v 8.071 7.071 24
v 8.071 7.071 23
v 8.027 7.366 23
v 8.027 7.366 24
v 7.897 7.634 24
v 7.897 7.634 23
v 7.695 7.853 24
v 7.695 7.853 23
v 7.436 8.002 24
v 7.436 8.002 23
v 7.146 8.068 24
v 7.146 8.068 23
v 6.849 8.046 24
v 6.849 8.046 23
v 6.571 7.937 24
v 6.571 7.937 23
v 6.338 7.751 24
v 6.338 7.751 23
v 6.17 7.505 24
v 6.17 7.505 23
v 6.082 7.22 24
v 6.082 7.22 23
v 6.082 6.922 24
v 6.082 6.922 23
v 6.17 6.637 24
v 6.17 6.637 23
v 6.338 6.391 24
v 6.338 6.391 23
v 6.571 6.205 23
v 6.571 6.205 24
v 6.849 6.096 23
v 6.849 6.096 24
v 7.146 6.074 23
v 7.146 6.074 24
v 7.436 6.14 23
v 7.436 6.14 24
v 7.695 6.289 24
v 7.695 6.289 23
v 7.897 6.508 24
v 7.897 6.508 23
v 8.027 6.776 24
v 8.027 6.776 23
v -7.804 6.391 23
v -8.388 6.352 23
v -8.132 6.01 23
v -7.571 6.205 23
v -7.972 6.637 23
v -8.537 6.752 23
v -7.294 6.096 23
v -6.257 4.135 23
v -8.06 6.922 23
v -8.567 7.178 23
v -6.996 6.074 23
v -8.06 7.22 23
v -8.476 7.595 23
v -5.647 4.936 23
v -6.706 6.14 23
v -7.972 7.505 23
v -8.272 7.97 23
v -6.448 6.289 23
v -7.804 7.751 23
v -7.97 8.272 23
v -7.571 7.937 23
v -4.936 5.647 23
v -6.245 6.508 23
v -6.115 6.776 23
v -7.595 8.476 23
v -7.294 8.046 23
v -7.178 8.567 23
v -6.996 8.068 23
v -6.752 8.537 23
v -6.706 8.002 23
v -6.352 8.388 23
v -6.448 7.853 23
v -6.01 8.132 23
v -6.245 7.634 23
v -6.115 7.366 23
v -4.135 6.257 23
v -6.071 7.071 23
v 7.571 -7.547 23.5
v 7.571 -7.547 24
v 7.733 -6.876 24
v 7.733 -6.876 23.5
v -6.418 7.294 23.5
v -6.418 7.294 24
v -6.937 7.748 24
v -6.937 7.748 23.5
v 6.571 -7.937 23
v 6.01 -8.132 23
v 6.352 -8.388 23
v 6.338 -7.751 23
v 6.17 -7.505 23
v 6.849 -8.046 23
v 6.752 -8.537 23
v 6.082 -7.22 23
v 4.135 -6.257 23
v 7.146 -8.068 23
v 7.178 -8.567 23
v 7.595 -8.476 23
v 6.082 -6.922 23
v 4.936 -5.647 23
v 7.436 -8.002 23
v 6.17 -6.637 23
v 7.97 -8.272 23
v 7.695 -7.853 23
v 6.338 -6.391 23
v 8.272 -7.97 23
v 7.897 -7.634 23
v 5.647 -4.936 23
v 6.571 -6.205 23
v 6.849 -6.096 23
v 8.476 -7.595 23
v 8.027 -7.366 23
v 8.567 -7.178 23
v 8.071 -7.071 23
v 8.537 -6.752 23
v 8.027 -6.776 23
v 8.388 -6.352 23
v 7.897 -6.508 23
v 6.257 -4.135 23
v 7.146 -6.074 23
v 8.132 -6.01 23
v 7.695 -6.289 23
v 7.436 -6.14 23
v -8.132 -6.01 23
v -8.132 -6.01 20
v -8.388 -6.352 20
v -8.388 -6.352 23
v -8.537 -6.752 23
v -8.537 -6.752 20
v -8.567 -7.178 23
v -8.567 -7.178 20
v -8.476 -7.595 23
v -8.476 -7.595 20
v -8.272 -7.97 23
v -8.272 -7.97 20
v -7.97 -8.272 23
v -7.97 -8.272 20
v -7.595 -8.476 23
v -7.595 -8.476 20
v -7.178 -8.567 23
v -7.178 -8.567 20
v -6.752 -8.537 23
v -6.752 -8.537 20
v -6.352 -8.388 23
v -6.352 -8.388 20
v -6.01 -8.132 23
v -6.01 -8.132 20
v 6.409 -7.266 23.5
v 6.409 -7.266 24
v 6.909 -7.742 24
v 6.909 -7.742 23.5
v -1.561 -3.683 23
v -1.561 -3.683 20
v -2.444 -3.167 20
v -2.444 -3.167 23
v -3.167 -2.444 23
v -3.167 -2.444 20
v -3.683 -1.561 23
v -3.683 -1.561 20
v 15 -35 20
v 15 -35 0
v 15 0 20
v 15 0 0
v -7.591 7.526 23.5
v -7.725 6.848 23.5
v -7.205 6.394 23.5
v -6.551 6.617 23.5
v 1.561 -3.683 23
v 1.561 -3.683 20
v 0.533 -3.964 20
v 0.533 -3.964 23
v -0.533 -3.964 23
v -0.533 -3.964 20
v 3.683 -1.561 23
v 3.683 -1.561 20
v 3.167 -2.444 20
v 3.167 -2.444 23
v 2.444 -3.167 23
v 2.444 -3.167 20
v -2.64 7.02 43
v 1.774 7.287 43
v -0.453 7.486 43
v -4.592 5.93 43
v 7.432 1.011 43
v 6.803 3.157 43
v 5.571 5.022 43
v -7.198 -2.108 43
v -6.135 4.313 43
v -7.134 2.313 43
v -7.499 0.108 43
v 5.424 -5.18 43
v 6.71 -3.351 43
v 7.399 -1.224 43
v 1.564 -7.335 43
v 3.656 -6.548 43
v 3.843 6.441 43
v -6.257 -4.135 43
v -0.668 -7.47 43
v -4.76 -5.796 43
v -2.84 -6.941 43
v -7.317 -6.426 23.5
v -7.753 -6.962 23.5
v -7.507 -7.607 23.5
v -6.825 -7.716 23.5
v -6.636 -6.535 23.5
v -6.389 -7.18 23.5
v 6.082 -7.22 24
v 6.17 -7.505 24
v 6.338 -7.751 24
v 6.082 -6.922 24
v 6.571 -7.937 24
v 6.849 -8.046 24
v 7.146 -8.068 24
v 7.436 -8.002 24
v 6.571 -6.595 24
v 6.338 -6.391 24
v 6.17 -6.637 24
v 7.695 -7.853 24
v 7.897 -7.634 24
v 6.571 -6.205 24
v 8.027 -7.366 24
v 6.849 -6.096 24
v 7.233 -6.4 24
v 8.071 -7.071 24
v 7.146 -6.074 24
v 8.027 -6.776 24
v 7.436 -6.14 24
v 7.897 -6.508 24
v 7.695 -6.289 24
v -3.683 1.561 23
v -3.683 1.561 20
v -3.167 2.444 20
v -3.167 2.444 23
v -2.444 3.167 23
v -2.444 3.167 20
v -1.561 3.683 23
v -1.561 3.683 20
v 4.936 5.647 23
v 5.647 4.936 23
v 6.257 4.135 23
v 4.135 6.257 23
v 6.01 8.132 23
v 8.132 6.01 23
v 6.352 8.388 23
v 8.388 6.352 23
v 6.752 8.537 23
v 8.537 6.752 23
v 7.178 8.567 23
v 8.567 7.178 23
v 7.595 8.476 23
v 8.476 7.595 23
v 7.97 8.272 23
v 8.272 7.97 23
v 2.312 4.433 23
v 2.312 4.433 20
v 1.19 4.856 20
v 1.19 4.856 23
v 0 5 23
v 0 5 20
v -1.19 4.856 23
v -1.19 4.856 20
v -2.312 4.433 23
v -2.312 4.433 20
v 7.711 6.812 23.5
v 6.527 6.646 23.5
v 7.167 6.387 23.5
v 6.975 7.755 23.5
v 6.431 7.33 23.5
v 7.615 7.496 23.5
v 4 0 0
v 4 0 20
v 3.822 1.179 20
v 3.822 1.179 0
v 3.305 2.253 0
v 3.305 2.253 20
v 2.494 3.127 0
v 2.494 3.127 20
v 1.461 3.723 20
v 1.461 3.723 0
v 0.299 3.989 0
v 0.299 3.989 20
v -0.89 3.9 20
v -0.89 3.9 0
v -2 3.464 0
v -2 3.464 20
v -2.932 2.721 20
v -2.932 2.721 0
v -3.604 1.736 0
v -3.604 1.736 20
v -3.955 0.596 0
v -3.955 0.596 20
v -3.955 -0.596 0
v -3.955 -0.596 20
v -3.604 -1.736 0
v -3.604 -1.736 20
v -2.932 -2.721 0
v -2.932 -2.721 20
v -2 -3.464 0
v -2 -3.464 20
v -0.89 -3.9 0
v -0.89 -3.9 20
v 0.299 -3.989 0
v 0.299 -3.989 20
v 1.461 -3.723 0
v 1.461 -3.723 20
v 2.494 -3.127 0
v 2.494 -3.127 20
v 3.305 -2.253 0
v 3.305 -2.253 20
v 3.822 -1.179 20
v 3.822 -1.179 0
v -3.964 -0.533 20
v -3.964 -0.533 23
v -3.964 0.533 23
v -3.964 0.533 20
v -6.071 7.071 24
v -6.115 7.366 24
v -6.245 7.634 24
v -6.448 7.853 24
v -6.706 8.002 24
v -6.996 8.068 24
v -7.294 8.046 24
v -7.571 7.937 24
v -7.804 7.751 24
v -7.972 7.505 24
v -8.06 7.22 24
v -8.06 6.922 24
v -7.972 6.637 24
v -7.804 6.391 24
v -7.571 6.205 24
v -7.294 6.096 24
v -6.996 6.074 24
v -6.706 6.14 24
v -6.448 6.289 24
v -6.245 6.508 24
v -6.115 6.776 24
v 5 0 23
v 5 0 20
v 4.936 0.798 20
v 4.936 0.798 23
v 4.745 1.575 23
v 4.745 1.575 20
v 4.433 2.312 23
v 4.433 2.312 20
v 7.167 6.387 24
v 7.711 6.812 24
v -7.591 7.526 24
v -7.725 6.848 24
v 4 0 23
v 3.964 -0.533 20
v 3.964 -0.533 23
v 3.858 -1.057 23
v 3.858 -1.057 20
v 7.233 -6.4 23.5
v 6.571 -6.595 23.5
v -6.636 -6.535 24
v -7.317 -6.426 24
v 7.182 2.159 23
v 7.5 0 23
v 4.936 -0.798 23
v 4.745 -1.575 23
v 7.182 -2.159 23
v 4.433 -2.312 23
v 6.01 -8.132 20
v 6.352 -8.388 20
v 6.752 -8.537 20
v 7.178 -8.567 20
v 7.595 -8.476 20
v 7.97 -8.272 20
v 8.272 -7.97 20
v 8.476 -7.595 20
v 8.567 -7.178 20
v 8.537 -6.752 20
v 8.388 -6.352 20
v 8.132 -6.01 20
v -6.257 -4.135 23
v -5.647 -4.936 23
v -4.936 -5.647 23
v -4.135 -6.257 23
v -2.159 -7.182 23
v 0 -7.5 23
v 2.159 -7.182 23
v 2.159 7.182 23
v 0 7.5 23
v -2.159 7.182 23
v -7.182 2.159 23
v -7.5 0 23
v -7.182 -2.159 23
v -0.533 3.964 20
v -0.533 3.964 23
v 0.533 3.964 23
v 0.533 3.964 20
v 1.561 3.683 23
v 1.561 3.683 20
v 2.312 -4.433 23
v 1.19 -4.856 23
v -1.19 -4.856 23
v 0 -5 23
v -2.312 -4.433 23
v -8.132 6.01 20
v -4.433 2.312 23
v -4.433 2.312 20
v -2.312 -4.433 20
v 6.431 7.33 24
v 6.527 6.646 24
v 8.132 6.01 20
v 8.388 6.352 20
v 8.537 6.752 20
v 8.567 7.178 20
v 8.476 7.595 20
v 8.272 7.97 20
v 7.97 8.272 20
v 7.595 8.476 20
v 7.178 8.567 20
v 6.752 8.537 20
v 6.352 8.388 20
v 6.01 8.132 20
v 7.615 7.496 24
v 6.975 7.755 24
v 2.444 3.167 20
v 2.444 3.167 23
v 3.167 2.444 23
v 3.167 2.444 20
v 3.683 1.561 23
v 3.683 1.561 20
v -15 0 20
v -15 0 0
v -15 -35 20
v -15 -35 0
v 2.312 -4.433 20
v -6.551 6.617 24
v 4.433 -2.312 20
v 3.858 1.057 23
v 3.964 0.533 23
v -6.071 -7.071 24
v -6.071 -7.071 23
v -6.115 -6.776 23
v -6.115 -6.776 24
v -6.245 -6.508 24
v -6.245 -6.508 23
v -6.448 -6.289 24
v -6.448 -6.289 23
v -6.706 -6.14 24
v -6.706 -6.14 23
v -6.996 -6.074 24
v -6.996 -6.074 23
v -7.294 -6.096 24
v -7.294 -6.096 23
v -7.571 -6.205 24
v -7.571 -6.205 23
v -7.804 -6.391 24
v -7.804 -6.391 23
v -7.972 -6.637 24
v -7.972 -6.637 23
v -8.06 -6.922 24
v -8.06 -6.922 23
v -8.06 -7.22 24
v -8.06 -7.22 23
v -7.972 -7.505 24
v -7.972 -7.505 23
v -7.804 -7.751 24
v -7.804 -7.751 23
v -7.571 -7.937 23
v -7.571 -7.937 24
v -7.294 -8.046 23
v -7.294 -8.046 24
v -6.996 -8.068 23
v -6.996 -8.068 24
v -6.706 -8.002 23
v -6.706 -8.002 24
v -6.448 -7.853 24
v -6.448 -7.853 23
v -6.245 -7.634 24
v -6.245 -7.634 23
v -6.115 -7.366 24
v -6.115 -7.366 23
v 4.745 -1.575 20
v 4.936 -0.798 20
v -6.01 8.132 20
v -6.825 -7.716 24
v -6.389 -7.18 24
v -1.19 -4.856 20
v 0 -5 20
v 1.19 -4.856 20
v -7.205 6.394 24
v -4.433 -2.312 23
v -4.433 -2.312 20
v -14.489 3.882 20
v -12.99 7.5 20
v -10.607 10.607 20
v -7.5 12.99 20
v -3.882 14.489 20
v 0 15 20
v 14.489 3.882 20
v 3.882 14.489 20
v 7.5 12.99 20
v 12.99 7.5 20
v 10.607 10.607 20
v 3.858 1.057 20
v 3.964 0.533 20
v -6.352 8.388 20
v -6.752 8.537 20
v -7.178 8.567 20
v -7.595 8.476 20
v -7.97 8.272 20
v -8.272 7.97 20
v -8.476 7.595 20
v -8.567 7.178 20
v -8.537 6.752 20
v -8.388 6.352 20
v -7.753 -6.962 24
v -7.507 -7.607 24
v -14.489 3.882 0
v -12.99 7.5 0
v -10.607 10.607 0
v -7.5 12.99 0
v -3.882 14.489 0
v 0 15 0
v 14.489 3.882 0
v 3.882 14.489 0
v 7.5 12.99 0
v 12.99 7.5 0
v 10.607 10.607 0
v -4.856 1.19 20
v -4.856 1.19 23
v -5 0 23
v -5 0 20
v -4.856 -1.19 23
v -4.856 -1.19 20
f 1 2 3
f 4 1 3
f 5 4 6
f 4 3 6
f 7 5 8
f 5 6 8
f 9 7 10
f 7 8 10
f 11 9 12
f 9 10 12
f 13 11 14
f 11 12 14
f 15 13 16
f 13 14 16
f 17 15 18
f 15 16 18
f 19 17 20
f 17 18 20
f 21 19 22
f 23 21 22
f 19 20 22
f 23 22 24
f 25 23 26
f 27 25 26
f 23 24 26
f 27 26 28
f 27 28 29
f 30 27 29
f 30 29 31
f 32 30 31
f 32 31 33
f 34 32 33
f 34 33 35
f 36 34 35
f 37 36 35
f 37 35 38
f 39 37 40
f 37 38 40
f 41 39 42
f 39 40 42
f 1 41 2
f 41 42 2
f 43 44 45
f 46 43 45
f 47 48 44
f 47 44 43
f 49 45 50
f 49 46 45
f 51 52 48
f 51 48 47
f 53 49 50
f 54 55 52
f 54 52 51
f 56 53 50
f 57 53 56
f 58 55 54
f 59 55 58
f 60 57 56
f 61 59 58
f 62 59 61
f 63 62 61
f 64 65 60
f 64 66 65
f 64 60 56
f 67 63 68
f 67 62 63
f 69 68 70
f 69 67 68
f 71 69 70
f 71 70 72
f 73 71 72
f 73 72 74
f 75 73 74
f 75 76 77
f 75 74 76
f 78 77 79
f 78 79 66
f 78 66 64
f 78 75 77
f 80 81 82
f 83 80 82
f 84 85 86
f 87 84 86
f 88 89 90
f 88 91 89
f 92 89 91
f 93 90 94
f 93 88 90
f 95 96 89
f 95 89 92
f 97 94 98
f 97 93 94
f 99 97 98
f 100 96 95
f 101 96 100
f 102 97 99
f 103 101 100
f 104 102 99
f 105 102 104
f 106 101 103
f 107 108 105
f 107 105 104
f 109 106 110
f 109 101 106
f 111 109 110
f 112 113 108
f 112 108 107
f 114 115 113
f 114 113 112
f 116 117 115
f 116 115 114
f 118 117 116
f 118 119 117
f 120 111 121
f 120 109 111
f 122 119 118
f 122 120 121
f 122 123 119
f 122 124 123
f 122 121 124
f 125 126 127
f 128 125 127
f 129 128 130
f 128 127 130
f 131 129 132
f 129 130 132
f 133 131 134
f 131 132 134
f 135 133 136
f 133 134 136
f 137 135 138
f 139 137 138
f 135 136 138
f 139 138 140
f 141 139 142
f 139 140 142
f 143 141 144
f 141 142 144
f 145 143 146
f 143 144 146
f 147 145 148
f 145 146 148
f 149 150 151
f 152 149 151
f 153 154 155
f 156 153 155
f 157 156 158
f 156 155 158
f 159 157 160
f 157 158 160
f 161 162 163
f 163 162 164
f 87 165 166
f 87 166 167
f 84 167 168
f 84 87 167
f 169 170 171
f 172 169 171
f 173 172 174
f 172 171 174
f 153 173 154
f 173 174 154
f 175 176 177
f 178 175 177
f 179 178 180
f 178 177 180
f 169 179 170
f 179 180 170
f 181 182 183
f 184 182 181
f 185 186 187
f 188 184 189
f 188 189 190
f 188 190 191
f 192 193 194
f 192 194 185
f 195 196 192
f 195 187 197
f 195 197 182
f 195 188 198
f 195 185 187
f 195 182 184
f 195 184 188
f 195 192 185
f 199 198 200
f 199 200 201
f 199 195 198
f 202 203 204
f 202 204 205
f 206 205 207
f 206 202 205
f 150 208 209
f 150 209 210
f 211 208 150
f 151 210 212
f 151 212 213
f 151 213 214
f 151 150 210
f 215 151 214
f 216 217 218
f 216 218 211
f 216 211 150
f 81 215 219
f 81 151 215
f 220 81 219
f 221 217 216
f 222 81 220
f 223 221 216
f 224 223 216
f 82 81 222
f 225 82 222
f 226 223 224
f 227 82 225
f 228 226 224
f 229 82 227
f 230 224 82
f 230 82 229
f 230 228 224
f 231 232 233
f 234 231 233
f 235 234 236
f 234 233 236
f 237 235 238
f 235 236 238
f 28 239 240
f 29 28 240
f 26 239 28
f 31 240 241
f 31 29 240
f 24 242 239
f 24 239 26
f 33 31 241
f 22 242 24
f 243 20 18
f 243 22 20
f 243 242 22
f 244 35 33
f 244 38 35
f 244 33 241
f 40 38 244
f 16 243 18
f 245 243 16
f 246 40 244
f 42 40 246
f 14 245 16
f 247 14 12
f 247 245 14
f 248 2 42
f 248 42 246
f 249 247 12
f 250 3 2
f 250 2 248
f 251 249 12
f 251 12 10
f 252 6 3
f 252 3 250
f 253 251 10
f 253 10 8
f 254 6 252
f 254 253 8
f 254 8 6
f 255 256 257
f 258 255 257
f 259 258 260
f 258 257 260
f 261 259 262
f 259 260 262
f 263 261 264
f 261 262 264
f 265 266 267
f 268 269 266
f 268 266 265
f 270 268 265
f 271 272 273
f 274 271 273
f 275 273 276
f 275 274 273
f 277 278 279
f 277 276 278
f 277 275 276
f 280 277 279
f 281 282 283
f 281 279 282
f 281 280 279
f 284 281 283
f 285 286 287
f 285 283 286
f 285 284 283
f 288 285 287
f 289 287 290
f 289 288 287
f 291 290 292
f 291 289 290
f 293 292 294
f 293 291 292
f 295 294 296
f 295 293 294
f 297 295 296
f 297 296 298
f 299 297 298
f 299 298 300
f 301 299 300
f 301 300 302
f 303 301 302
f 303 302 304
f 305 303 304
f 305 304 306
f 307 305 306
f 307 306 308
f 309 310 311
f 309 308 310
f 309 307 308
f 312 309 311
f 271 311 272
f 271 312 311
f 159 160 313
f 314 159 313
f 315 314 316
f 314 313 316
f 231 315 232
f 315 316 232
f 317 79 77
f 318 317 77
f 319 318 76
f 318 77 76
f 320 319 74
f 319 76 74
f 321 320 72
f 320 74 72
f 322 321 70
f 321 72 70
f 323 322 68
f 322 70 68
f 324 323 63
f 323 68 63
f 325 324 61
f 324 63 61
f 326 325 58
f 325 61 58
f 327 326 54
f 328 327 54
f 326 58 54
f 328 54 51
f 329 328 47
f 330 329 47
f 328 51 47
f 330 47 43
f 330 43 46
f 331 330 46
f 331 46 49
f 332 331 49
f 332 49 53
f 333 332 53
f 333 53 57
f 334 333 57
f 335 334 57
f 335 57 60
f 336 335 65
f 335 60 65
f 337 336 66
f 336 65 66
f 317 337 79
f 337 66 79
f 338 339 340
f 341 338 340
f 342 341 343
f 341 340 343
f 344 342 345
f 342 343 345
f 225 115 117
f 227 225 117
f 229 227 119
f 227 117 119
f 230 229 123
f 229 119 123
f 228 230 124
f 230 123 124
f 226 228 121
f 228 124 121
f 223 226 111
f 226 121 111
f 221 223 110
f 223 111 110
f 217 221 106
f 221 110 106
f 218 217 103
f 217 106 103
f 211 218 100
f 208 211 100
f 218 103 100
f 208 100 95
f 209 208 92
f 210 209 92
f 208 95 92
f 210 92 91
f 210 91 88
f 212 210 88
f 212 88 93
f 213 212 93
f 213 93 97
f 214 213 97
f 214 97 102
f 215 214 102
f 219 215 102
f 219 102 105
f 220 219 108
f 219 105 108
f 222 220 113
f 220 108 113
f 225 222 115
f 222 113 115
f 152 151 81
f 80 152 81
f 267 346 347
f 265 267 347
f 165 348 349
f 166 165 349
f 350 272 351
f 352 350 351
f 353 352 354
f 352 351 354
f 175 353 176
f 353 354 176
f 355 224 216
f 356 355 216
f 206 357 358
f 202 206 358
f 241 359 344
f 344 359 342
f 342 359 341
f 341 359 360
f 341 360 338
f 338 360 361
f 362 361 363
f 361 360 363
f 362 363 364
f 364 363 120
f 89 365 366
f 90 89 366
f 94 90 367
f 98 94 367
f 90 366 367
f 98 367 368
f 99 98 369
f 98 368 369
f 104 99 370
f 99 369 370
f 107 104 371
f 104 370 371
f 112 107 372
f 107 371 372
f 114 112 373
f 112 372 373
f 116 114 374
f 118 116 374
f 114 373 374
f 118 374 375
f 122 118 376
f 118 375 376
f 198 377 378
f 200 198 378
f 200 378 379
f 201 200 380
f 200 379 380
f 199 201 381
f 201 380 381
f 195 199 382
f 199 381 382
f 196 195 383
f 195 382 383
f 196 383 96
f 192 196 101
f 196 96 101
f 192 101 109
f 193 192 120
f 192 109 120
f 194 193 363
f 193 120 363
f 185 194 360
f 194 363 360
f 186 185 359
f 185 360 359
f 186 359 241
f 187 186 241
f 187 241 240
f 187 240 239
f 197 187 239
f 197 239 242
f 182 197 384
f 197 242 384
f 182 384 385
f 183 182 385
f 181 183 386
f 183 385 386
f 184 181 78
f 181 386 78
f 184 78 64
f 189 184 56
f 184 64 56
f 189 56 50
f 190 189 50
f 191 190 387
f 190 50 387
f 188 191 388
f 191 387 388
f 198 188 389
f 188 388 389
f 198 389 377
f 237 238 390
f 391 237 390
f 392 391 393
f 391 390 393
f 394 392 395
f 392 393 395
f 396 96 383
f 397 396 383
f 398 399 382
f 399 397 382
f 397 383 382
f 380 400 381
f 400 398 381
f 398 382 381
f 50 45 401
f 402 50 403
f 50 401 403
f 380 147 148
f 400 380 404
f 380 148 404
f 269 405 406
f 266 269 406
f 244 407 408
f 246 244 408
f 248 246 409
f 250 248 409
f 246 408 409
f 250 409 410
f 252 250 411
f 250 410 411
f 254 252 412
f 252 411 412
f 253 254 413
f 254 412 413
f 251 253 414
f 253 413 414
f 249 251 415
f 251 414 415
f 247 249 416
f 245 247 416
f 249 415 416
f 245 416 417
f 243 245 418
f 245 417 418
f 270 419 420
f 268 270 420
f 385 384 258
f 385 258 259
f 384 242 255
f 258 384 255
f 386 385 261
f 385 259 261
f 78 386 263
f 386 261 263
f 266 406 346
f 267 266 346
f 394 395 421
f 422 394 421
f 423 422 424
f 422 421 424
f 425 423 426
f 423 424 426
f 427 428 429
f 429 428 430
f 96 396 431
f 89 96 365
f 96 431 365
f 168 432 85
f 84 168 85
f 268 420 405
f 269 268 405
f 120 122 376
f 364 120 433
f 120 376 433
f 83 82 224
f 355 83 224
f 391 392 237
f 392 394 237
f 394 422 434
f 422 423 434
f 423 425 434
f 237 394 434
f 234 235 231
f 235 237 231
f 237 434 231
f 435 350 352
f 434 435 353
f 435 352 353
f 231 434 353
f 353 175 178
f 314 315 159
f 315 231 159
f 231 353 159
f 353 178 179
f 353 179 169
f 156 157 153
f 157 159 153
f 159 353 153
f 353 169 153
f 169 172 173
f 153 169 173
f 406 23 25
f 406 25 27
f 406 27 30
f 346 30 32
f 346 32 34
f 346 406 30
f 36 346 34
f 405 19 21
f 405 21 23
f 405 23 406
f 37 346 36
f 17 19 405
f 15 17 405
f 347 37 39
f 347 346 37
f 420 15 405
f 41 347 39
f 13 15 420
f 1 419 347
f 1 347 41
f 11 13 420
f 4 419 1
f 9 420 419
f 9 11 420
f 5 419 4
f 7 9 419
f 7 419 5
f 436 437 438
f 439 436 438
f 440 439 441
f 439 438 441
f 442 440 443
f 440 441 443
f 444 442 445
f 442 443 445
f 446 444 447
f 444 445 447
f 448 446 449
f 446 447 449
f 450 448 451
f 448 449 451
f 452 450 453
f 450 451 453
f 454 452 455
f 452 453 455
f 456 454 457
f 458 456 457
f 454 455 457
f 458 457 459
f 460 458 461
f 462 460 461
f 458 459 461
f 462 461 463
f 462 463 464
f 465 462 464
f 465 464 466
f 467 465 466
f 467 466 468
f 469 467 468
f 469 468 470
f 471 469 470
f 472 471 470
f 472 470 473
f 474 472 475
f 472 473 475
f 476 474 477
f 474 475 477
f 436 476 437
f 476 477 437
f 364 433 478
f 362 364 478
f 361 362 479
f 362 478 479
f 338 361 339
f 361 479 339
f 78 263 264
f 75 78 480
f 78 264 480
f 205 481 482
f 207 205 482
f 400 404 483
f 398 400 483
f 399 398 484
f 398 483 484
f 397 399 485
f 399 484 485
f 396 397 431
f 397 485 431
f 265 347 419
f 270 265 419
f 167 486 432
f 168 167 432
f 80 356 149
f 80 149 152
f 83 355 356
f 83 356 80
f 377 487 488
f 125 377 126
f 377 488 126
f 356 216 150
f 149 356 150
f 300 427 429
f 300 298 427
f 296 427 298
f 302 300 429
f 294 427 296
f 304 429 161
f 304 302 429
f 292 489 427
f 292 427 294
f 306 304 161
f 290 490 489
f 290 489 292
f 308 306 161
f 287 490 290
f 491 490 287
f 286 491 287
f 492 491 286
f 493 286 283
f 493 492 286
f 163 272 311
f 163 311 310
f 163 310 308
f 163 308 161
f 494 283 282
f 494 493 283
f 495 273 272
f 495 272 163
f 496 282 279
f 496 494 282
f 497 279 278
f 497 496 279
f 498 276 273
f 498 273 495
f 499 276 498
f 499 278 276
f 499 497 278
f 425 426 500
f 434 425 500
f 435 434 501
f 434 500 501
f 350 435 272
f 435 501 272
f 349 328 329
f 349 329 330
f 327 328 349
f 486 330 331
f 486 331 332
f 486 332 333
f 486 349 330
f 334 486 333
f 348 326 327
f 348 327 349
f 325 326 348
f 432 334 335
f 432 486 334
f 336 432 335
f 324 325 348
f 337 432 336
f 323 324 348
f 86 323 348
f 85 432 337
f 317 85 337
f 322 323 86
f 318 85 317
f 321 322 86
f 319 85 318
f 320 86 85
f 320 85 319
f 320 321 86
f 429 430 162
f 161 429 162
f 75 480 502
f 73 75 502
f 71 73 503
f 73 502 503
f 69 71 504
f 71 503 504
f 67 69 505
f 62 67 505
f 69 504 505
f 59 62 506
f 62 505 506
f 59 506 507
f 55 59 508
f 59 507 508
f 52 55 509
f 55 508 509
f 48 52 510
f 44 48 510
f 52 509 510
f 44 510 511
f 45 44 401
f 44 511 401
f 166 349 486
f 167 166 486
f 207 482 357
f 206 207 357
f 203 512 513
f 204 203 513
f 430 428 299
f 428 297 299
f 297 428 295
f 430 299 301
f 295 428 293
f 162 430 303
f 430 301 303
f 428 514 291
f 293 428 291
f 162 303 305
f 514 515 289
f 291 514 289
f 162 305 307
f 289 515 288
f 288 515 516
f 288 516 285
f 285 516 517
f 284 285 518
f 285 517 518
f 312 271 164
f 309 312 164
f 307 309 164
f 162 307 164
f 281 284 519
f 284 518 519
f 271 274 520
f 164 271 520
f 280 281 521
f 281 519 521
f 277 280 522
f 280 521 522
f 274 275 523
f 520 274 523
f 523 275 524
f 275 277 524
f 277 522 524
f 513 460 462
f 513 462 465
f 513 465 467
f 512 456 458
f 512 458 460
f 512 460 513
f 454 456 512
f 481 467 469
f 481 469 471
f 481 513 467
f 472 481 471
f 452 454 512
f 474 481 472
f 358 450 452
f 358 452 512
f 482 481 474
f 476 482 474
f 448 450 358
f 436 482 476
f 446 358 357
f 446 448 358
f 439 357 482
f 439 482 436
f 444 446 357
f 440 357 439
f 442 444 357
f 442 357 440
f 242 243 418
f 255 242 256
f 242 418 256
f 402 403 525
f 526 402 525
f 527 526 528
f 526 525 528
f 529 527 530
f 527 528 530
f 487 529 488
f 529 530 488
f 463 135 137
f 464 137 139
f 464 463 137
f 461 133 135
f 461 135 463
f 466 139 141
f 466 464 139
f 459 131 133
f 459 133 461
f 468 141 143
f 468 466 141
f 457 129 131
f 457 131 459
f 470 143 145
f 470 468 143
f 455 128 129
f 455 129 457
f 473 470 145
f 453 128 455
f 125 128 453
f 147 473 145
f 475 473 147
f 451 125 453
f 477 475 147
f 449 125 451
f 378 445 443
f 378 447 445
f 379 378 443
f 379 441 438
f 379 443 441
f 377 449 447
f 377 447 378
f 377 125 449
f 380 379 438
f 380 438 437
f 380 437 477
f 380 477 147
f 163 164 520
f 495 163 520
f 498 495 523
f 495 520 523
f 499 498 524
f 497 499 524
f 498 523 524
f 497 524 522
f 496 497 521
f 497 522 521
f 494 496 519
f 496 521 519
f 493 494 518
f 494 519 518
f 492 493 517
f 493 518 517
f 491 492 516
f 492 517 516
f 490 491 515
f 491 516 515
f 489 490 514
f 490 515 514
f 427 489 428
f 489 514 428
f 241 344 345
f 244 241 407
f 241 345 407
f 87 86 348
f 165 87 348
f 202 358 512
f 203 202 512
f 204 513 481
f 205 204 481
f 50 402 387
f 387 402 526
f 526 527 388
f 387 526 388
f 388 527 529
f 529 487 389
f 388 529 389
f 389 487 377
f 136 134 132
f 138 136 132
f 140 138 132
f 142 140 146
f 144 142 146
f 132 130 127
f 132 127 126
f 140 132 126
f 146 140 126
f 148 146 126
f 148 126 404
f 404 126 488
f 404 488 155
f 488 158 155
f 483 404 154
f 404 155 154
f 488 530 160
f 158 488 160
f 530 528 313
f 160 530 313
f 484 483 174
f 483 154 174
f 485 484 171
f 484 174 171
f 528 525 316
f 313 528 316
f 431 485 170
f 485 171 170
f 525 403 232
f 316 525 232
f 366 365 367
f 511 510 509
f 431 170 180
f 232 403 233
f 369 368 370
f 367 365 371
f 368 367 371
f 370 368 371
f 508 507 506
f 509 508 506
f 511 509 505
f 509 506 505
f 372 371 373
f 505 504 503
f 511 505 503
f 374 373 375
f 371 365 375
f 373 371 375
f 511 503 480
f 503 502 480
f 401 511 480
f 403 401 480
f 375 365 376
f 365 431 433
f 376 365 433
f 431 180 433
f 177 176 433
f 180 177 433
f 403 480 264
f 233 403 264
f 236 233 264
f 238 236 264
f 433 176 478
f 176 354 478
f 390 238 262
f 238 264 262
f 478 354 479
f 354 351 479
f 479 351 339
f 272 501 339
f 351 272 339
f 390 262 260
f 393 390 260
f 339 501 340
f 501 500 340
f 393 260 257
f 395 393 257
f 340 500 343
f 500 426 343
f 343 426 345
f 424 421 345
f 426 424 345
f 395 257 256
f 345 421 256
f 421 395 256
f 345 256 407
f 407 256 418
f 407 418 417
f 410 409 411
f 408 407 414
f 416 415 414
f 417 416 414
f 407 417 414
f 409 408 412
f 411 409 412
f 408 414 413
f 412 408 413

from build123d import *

# Parameters (mm, degrees)
BOSS_EXTRUDE1_DEPTH     = 20
CUT_EXTRUDE1_DEPTH      = 44.011626335
CUT_EXTRUDE1_DEPTH_BACK = 44.011626335
SKETCH2_R               = 4
SKETCH4_R               = 1.5
BOSS_EXTRUDE2_DEPTH     = 3
SKETCH5_R               = 1
BOSS_EXTRUDE3_DEPTH     = 1
CUT_EXTRUDE2_DEPTH      = 0.5
SKETCH7_R               = 7.5
BOSS_EXTRUDE4_DEPTH     = 20


with BuildPart() as part:
    # Sketch1 → Boss-Extrude1 (new body)
    with BuildSketch(Plane.XY):
        with BuildLine():
            ThreePointArc((15, 0), (0, 15), (-15, 0))
            Line((-15, 0), (15, 0))
        make_face()
        with BuildLine():
            Line((15, 0), (-15, 0))
            ThreePointArc((-15, 0), (0, -15), (15, 0))
        make_face()
        with BuildLine():
            ThreePointArc((15, 0), (0, -15), (-15, 0))
            Line((-15, 0), (-15, -35))
            Line((-15, -35), (15, -35))
            Line((15, -35), (15, 0))
        make_face()
    extrude(amount=BOSS_EXTRUDE1_DEPTH)

    # Sketch2 → Cut-Extrude1 (cut, two sides: drawn at the far end of the back side and taken through both)
    with BuildSketch(Plane.XY.offset(20).offset(-CUT_EXTRUDE1_DEPTH_BACK)):
        Circle(SKETCH2_R)
    extrude(amount=CUT_EXTRUDE1_DEPTH + CUT_EXTRUDE1_DEPTH_BACK, mode=Mode.SUBTRACT)


with BuildPart() as body_2:
    # Sketch4 → Boss-Extrude2 (new body)
    with BuildSketch(Plane.XY.offset(20)):
        with Locations((7.071067812, -7.071067812)):
            Circle(SKETCH4_R)
        with BuildLine():
            Line((8.131727984, -6.01040764), (4.433344563, -2.312024219))
            ThreePointArc((4.433344563, -2.312024219), (3.535533906, -3.535533906), (2.312024219, -4.433344563))
            Line((2.312024219, -4.433344563), (6.01040764, -8.131727984))
            ThreePointArc((6.01040764, -8.131727984), (6.01040764, -6.01040764), (8.131727984, -6.01040764))
        make_face()
        with BuildLine():
            ThreePointArc((5, 0), (4.856270319, 1.190226278), (4.433344563, 2.312024219))
            Line((4.433344563, 2.312024219), (3.682682292, 1.561361949))
            ThreePointArc((3.682682292, 1.561361949), (3.919867929, 0.796640079), (4, 0))
            ThreePointArc((4, 0), (3.919867929, -0.796640079), (3.682682292, -1.561361949))
            Line((3.682682292, -1.561361949), (4.433344563, -2.312024219))
            ThreePointArc((4.433344563, -2.312024219), (4.856270319, -1.190226278), (5, 0))
        make_face()
        with BuildLine():
            ThreePointArc((2.312024219, -4.433344563), (3.535533906, -3.535533906), (4.433344563, -2.312024219))
            Line((4.433344563, -2.312024219), (3.682682292, -1.561361949))
            ThreePointArc((3.682682292, -1.561361949), (2.828427125, -2.828427125), (1.561361949, -3.682682292))
            Line((1.561361949, -3.682682292), (2.312024219, -4.433344563))
        make_face()
        with BuildLine():
            Line((-1.561361949, 3.682682292), (-2.312024219, 4.433344563))
            ThreePointArc((-2.312024219, 4.433344563), (-3.535533906, 3.535533906), (-4.433344563, 2.312024219))
            Line((-4.433344563, 2.312024219), (-3.682682292, 1.561361949))
            ThreePointArc((-3.682682292, 1.561361949), (-2.828427125, 2.828427125), (-1.561361949, 3.682682292))
        make_face()
        with BuildLine():
            ThreePointArc((-2.312024219, -4.433344563), (0, -5), (2.312024219, -4.433344563))
            Line((2.312024219, -4.433344563), (1.561361949, -3.682682292))
            ThreePointArc((1.561361949, -3.682682292), (0, -4), (-1.561361949, -3.682682292))
            Line((-1.561361949, -3.682682292), (-2.312024219, -4.433344563))
        make_face()
        with BuildLine():
            Line((3.682682292, 1.561361949), (4.433344563, 2.312024219))
            ThreePointArc((4.433344563, 2.312024219), (3.535533906, 3.535533906), (2.312024219, 4.433344563))
            Line((2.312024219, 4.433344563), (1.561361949, 3.682682292))
            ThreePointArc((1.561361949, 3.682682292), (2.828427125, 2.828427125), (3.682682292, 1.561361949))
        make_face()
        with BuildLine():
            Line((-2.312024219, -4.433344563), (-1.561361949, -3.682682292))
            ThreePointArc((-1.561361949, -3.682682292), (-2.828427125, -2.828427125), (-3.682682292, -1.561361949))
            Line((-3.682682292, -1.561361949), (-4.433344563, -2.312024219))
            ThreePointArc((-4.433344563, -2.312024219), (-3.535533906, -3.535533906), (-2.312024219, -4.433344563))
        make_face()
        with BuildLine():
            Line((-3.682682292, 1.561361949), (-4.433344563, 2.312024219))
            ThreePointArc((-4.433344563, 2.312024219), (-5, 0), (-4.433344563, -2.312024219))
            Line((-4.433344563, -2.312024219), (-3.682682292, -1.561361949))
            ThreePointArc((-3.682682292, -1.561361949), (-4, 0), (-3.682682292, 1.561361949))
        make_face()
        with BuildLine():
            Line((1.561361949, 3.682682292), (2.312024219, 4.433344563))
            ThreePointArc((2.312024219, 4.433344563), (0, 5), (-2.312024219, 4.433344563))
            Line((-2.312024219, 4.433344563), (-1.561361949, 3.682682292))
            ThreePointArc((-1.561361949, 3.682682292), (0, 4), (1.561361949, 3.682682292))
        make_face()
        with BuildLine():
            Line((4.433344563, 2.312024219), (8.131727984, 6.01040764))
            ThreePointArc((8.131727984, 6.01040764), (6.01040764, 6.01040764), (6.01040764, 8.131727984))
            Line((6.01040764, 8.131727984), (2.312024219, 4.433344563))
            ThreePointArc((2.312024219, 4.433344563), (3.535533906, 3.535533906), (4.433344563, 2.312024219))
        make_face()
        with Locations((7.071067812, 7.071067812)):
            Circle(SKETCH4_R)
        with Locations((-7.071067812, 7.071067812)):
            Circle(SKETCH4_R)
        with BuildLine():
            ThreePointArc((-4.433344563, 2.312024219), (-3.535533906, 3.535533906), (-2.312024219, 4.433344563))
            Line((-2.312024219, 4.433344563), (-6.01040764, 8.131727984))
            ThreePointArc((-6.01040764, 8.131727984), (-5.685248513, 7.64509296), (-5.571067812, 7.071067812))
            ThreePointArc((-5.571067812, 7.071067812), (-6.497042663, 5.685248513), (-8.131727984, 6.01040764))
            Line((-8.131727984, 6.01040764), (-4.433344563, 2.312024219))
        make_face()
        with BuildLine():
            Line((-6.01040764, -8.131727984), (-2.312024219, -4.433344563))
            ThreePointArc((-2.312024219, -4.433344563), (-3.535533906, -3.535533906), (-4.433344563, -2.312024219))
            Line((-4.433344563, -2.312024219), (-8.131727984, -6.01040764))
            ThreePointArc((-8.131727984, -6.01040764), (-6.497042663, -5.685248513), (-5.571067812, -7.071067812))
            ThreePointArc((-5.571067812, -7.071067812), (-5.685248513, -7.64509296), (-6.01040764, -8.131727984))
        make_face()
        with Locations((-7.071067812, -7.071067812)):
            Circle(SKETCH4_R)
    extrude(amount=BOSS_EXTRUDE2_DEPTH)

    # Sketch5 → Boss-Extrude3 (add)
    with BuildSketch(Plane.XY.offset(23)):
        with Locations((7.071067812, -7.071067812)):
            Circle(SKETCH5_R)
        with Locations((-7.071067812, -7.071067812)):
            Circle(SKETCH5_R)
        with Locations((-7.071067812, 7.071067812)):
            Circle(SKETCH5_R)
        with Locations((7.071067812, 7.071067812)):
            Circle(SKETCH5_R)
    extrude(amount=BOSS_EXTRUDE3_DEPTH)

    # Sketch6 → Cut-Extrude2 (cut)
    with BuildSketch(Plane.XY.offset(24)):
        Polygon((7.233361769, -6.400017083), (6.571067812, -6.594991758), (6.408773855, -7.266042487), (6.908773855, -7.742118541), (7.571067812, -7.547143866), (7.733361769, -6.876093137), align=None)
        Polygon((-7.317210607, -6.426039027), (-7.752750524, -6.961719333), (-7.506607728, -7.606748118), (-6.824925017, -7.716096597), (-6.3893851, -7.180416291), (-6.635527895, -6.535387506), align=None)
        Polygon((-7.590724774, 7.525606096), (-7.724537994, 6.848300824), (-7.204881032, 6.39376254), (-6.55141085, 6.616529528), (-6.41759763, 7.2938348), (-6.937254592, 7.748373084), align=None)
        Polygon((6.975043436, 7.754754676), (6.430965431, 7.329751695), (6.526989807, 6.646064831), (7.167092188, 6.387380947), (7.711170193, 6.812383929), (7.615145817, 7.496070793), align=None)
    extrude(amount=-CUT_EXTRUDE2_DEPTH, mode=Mode.SUBTRACT)

    # Sketch7 → Boss-Extrude4 (add)
    with BuildSketch(Plane.XY.offset(23)):
        with Locations(Location((0, 0, 0), (0, 0, 213.463040967))):
            Circle(SKETCH7_R)
    extrude(amount=BOSS_EXTRUDE4_DEPTH)


solid = Compound([part.part, body_2.part])
